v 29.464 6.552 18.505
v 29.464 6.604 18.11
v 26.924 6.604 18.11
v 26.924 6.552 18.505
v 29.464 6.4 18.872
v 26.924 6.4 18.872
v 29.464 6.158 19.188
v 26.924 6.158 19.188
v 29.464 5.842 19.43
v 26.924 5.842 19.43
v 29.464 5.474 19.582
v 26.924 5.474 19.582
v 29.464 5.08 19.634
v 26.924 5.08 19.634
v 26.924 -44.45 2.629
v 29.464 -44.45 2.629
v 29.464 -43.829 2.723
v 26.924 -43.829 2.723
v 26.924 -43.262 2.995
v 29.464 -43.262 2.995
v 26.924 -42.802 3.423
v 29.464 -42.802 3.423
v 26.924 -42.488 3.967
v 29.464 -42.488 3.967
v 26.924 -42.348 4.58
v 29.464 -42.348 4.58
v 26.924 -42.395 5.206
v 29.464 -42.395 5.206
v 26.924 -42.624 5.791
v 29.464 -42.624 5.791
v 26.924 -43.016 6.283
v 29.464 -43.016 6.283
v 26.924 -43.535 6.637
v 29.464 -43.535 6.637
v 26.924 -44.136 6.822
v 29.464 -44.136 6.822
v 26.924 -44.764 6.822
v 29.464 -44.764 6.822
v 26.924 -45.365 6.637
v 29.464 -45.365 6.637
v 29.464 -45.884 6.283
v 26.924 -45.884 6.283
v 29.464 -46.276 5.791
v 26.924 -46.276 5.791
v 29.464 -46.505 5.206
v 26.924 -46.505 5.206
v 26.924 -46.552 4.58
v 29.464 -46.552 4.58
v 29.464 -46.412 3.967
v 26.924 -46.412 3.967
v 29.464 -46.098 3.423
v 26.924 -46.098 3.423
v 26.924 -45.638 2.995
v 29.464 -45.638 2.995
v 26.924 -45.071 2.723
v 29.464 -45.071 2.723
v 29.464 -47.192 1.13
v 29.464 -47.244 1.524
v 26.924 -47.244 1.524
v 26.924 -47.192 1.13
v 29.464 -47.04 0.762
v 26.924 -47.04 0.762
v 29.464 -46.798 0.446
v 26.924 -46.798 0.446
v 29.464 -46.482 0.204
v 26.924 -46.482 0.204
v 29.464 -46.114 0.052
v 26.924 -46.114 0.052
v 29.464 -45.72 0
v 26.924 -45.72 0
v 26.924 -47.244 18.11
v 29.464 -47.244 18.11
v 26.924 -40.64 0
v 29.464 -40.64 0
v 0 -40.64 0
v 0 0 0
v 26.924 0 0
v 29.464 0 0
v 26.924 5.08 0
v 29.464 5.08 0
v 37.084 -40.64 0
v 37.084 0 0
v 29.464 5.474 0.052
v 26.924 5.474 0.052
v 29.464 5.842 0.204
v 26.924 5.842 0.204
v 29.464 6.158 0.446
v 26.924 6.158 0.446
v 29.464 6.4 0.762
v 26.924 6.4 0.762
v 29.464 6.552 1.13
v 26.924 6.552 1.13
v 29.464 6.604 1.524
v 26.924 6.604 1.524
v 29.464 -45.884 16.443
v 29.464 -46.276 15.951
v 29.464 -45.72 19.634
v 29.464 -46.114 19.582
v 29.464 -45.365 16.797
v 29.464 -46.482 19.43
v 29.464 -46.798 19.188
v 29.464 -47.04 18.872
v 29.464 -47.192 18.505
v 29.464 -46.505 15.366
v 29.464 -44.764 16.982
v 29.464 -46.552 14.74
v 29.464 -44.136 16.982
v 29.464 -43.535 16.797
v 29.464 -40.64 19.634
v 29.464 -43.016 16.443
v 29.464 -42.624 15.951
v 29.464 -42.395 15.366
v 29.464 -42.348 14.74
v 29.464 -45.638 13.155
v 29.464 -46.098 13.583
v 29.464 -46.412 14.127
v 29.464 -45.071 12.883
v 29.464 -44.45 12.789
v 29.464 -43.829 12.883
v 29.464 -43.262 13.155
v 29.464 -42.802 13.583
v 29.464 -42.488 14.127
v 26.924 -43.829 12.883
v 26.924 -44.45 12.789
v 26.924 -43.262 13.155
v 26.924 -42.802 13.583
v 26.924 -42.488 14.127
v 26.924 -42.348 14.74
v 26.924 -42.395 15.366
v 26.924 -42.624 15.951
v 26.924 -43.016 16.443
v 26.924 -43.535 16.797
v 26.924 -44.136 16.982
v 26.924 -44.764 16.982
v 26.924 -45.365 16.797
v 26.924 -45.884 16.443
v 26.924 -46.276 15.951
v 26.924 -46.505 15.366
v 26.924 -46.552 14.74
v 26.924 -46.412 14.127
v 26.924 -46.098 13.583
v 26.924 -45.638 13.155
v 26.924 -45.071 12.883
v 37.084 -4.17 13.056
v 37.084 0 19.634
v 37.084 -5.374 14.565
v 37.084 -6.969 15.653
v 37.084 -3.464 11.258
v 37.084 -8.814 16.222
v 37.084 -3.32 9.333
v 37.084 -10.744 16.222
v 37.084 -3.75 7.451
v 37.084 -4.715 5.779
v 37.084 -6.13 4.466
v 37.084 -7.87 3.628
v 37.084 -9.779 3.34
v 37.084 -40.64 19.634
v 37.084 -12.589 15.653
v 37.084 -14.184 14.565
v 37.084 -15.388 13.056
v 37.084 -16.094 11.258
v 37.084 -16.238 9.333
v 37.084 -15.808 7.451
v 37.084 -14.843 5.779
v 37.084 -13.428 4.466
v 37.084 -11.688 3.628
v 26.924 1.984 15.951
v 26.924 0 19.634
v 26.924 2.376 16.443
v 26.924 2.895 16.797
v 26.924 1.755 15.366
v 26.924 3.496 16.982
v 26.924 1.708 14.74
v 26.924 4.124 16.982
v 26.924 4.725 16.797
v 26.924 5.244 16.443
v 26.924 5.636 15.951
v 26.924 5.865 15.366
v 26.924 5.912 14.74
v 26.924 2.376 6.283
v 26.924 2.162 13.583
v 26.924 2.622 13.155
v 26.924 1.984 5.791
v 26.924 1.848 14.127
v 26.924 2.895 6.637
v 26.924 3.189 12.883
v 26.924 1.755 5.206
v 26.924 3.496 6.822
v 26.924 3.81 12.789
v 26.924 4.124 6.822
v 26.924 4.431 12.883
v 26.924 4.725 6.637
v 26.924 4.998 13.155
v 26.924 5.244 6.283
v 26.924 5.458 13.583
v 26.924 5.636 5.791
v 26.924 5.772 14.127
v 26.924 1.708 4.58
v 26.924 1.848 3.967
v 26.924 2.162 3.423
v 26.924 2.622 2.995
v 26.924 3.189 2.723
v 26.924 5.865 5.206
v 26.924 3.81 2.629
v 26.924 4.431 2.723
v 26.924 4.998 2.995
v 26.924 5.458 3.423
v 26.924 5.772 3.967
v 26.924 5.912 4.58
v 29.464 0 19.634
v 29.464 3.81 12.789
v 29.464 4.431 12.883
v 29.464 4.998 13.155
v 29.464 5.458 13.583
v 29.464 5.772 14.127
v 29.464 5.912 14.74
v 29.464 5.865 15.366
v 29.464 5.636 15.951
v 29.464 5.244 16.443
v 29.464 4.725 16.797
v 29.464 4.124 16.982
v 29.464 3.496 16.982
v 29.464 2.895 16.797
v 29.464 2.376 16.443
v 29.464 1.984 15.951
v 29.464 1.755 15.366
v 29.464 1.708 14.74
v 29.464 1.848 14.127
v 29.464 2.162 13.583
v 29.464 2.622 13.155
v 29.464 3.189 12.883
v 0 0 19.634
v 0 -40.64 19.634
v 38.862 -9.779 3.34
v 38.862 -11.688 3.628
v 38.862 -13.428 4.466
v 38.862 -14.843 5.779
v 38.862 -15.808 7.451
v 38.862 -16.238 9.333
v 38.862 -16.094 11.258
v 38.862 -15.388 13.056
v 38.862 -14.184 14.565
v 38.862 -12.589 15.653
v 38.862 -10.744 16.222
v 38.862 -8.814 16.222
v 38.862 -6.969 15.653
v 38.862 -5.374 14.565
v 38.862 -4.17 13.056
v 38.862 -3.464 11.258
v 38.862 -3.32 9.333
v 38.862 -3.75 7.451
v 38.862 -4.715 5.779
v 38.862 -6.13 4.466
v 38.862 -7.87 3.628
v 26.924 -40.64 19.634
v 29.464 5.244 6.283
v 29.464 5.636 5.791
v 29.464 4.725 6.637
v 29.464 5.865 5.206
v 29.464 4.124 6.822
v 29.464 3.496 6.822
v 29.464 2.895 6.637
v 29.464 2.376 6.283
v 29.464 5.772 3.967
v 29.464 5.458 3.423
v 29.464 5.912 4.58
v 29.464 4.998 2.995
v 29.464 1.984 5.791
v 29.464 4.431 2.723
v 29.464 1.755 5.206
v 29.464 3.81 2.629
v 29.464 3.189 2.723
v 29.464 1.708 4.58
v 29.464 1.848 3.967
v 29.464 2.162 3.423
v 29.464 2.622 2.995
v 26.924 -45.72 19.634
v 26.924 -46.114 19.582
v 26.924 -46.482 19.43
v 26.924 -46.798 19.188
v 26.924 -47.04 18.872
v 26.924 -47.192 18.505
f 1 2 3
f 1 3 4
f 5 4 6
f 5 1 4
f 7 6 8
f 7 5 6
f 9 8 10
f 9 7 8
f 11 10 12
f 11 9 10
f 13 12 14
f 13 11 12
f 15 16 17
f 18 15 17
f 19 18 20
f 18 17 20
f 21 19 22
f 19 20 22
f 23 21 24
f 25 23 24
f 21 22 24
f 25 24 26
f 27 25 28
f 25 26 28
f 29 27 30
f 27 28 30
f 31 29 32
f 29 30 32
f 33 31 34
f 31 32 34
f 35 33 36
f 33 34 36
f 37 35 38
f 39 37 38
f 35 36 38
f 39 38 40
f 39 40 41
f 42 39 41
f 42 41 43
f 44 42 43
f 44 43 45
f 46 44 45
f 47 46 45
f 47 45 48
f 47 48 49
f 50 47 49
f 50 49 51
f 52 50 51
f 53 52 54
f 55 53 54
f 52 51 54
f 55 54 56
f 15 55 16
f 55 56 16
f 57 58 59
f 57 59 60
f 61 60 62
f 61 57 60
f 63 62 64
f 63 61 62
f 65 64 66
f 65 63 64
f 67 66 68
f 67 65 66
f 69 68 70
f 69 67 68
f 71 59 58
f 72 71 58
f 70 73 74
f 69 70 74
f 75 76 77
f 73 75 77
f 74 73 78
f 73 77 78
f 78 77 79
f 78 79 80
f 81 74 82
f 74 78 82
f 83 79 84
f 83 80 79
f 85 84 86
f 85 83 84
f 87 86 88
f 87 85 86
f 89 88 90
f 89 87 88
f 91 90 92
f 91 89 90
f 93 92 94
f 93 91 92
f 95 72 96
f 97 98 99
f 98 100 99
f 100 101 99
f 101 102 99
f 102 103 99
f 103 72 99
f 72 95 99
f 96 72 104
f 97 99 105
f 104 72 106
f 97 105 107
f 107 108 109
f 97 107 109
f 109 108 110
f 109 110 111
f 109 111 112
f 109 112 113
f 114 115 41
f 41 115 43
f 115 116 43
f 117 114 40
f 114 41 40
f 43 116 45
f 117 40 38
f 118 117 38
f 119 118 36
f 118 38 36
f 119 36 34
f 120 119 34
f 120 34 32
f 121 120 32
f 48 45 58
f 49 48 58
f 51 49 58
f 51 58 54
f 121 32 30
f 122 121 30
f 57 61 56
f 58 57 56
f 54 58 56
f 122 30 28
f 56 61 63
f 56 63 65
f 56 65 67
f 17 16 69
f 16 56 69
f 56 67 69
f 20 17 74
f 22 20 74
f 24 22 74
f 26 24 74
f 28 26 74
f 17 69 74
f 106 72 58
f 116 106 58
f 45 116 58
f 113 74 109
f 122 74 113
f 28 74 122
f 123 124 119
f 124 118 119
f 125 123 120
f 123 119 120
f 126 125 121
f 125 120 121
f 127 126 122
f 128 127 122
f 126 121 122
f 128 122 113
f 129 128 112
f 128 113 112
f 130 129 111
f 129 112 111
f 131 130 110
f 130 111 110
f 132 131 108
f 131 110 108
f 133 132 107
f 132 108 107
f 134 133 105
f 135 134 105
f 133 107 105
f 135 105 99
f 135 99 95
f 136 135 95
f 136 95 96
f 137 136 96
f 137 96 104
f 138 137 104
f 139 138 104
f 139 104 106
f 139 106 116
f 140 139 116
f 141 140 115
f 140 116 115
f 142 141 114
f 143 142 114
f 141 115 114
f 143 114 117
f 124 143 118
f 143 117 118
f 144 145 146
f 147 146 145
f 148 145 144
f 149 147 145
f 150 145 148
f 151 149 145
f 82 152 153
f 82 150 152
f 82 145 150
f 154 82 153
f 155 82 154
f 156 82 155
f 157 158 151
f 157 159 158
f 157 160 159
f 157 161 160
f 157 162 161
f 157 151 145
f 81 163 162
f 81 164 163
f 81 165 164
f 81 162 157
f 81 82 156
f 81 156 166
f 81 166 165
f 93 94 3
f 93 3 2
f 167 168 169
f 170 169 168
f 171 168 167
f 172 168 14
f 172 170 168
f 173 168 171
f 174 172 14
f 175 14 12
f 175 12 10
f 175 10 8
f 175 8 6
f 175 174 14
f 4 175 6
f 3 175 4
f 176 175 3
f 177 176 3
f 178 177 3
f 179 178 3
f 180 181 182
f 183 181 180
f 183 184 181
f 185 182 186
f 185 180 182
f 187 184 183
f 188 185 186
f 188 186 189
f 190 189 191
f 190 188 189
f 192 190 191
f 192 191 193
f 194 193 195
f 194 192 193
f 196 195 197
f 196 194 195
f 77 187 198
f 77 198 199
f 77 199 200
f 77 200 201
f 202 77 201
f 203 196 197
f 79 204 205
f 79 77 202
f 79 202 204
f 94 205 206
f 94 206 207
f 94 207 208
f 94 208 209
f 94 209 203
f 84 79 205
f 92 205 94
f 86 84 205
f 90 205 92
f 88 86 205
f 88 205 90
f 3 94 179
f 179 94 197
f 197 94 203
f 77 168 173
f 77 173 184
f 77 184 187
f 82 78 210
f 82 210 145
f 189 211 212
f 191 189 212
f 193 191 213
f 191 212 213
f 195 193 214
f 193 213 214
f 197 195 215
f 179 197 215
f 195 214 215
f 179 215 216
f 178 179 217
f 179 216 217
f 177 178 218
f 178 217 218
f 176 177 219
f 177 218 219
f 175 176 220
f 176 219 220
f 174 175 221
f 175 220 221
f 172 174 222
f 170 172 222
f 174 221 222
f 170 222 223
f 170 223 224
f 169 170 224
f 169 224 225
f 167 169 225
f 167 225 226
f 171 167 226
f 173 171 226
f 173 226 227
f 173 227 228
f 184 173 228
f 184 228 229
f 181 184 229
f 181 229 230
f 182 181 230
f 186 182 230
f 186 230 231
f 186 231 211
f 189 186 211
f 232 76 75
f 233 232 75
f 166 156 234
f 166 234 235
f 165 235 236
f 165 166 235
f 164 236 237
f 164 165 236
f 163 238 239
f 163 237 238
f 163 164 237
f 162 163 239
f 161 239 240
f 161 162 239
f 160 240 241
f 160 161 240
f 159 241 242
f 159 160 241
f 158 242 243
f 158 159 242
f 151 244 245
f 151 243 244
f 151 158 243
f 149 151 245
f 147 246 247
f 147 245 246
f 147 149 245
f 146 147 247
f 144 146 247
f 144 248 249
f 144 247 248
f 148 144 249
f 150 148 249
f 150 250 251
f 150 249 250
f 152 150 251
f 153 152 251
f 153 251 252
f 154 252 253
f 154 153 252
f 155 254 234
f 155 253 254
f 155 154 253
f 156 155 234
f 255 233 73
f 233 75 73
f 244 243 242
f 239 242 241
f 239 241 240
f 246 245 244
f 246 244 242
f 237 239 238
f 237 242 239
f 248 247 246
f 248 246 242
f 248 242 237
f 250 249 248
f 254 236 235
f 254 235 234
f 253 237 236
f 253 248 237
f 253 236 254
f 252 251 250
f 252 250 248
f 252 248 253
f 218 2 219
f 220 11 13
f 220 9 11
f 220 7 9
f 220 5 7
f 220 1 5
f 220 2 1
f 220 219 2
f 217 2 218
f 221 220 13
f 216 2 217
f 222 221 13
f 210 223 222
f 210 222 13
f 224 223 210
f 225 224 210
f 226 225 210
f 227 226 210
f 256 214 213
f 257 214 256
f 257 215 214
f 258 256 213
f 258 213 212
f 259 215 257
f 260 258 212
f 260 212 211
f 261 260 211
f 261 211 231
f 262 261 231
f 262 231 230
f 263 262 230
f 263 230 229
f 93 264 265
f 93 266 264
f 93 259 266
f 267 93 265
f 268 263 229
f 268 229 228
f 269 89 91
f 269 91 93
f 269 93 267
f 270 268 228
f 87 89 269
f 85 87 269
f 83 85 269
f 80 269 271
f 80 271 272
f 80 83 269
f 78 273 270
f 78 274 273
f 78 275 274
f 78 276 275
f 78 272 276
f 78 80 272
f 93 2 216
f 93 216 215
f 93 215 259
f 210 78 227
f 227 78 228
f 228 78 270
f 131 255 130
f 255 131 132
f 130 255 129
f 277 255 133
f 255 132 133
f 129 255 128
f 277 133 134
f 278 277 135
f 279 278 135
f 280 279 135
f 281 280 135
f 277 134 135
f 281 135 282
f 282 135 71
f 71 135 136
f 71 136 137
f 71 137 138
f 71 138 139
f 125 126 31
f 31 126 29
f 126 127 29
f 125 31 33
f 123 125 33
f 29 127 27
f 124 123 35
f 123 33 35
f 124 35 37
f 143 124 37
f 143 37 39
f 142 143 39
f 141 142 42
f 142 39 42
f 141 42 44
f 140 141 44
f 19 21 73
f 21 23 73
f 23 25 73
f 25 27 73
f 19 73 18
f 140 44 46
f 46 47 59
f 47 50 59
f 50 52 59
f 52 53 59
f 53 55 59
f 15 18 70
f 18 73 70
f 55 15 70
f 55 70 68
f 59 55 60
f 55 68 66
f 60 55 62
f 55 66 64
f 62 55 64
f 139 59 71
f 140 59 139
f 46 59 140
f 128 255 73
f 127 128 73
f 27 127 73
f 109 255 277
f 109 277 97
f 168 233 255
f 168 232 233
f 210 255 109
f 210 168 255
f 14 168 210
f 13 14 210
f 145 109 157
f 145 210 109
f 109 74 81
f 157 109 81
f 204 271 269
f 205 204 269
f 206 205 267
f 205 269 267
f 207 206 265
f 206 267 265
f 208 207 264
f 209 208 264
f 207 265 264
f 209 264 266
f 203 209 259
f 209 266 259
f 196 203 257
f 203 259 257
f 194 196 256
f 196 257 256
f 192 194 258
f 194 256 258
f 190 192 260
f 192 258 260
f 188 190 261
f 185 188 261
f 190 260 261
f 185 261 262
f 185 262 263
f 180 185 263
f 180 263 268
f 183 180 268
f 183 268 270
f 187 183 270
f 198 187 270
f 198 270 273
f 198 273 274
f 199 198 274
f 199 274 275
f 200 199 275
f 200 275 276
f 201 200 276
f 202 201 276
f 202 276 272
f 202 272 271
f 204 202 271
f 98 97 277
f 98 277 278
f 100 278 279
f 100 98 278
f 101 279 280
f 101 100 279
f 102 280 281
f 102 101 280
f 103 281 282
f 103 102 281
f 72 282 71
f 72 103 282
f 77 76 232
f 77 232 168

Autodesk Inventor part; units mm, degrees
ref_plane "YZ Plane" through (0, 0, 0) normal (1, 0, 0) x (0, 1, 0)
ref_plane "XZ Plane" through (0, 0, 0) normal (0, 1, 0) x (-1, 0, 0)
ref_plane "XY Plane" through (0, 0, 0) normal (0, 0, 1) x (1, 0, 0)
sketch "Sketch1" plane through (0, 0, 0) normal (0, 0, 1) x (1, 0, 0)
  line L0 (0, 0) -> (0, -40.64)
  line L1 (0, -40.64) -> (26.924, -40.64)
  line L2 (0, 0) -> (26.924, 0)
  line L3 (26.924, -40.64) -> (26.924, -47.244)
  line L4 (26.924, -47.244) -> (29.464, -47.244)
  line L5 (29.464, -47.244) -> (29.464, -40.64)
  line L6 (26.924, 0) -> (26.924, 6.604)
  line L7 (26.924, 6.604) -> (29.464, 6.604)
  line L8 (29.464, 6.604) -> (29.464, 0)
  line L9 (29.464, 0) -> (37.084, 0)
  line L10 (29.464, -40.64) -> (37.084, -40.64)
  line L11 (37.084, 0) -> (37.084, -40.64)
  dimension "d0" = 40.64
  dimension "d4" = 6.604
  dimension "d45" = 2.54
  dimension "d46" = 26.924
  dimension "d47" = 7.62
extrude "Extrusion8" add sketch "Sketch1" along normal blind 19.6342
sketch "Sketch8" plane through (37.084, -40.64, 0) normal (1, 0, 0) x (0, 0, -1)
  line L0 (0, 0) -> (0, 40.64) projected
  line L1 (0, 40.64) -> (-19.6342, 40.64) projected
  line L2 (-19.6342, 0) -> (-19.6342, 40.64) projected
  line L3 (0, 0) -> (-19.6342, 0) projected
  circle A0 centre (-9.8171, 30.861) radius 6.477
  dimension "d50" = 12.954
  dimension "d51" = 9.779
extrude "Extrusion9" add sketch "Sketch8" along normal blind 1.778 contours A0
sketch "Sketch9" plane through (29.464, 0, 0) normal (1, 0, 0) x (0, 0, -1)
  circle A0 centre (-14.8971, 3.81) radius 2.1082
  line L0 (0, 6.604) -> (-19.6342, 6.604) projected
  line L1 (-9.8171, 6.604) -> (-9.8171, 8.0872)
  line L2 (0, 0) -> (-19.6342, 0) projected
  circle A1 centre (-4.7371, 3.81) radius 2.1082
  line L3 (0, 0) -> (0, -40.64) projected
  line L4 (0, -20.32) -> (8.7495, -20.32)
  circle A2 centre (-14.8971, -44.45) radius 2.1082
  circle A3 centre (-4.7371, -44.45) radius 2.1082
  dimension "d54" = 4.2164
  dimension "d55" = 5.08
  dimension "d56" = 3.81
extrude "Extrusion10" cut sketch "Sketch9" against normal through all
fillet "Fillet1" radius 1.524 4 edges at (28.194, 6.604, 19.6342) (28.194, 6.604, 0) (28.194, -47.244, 19.6342) (28.194, -47.244, 0)
properties part number "Servo" material "ABS Plastic"
